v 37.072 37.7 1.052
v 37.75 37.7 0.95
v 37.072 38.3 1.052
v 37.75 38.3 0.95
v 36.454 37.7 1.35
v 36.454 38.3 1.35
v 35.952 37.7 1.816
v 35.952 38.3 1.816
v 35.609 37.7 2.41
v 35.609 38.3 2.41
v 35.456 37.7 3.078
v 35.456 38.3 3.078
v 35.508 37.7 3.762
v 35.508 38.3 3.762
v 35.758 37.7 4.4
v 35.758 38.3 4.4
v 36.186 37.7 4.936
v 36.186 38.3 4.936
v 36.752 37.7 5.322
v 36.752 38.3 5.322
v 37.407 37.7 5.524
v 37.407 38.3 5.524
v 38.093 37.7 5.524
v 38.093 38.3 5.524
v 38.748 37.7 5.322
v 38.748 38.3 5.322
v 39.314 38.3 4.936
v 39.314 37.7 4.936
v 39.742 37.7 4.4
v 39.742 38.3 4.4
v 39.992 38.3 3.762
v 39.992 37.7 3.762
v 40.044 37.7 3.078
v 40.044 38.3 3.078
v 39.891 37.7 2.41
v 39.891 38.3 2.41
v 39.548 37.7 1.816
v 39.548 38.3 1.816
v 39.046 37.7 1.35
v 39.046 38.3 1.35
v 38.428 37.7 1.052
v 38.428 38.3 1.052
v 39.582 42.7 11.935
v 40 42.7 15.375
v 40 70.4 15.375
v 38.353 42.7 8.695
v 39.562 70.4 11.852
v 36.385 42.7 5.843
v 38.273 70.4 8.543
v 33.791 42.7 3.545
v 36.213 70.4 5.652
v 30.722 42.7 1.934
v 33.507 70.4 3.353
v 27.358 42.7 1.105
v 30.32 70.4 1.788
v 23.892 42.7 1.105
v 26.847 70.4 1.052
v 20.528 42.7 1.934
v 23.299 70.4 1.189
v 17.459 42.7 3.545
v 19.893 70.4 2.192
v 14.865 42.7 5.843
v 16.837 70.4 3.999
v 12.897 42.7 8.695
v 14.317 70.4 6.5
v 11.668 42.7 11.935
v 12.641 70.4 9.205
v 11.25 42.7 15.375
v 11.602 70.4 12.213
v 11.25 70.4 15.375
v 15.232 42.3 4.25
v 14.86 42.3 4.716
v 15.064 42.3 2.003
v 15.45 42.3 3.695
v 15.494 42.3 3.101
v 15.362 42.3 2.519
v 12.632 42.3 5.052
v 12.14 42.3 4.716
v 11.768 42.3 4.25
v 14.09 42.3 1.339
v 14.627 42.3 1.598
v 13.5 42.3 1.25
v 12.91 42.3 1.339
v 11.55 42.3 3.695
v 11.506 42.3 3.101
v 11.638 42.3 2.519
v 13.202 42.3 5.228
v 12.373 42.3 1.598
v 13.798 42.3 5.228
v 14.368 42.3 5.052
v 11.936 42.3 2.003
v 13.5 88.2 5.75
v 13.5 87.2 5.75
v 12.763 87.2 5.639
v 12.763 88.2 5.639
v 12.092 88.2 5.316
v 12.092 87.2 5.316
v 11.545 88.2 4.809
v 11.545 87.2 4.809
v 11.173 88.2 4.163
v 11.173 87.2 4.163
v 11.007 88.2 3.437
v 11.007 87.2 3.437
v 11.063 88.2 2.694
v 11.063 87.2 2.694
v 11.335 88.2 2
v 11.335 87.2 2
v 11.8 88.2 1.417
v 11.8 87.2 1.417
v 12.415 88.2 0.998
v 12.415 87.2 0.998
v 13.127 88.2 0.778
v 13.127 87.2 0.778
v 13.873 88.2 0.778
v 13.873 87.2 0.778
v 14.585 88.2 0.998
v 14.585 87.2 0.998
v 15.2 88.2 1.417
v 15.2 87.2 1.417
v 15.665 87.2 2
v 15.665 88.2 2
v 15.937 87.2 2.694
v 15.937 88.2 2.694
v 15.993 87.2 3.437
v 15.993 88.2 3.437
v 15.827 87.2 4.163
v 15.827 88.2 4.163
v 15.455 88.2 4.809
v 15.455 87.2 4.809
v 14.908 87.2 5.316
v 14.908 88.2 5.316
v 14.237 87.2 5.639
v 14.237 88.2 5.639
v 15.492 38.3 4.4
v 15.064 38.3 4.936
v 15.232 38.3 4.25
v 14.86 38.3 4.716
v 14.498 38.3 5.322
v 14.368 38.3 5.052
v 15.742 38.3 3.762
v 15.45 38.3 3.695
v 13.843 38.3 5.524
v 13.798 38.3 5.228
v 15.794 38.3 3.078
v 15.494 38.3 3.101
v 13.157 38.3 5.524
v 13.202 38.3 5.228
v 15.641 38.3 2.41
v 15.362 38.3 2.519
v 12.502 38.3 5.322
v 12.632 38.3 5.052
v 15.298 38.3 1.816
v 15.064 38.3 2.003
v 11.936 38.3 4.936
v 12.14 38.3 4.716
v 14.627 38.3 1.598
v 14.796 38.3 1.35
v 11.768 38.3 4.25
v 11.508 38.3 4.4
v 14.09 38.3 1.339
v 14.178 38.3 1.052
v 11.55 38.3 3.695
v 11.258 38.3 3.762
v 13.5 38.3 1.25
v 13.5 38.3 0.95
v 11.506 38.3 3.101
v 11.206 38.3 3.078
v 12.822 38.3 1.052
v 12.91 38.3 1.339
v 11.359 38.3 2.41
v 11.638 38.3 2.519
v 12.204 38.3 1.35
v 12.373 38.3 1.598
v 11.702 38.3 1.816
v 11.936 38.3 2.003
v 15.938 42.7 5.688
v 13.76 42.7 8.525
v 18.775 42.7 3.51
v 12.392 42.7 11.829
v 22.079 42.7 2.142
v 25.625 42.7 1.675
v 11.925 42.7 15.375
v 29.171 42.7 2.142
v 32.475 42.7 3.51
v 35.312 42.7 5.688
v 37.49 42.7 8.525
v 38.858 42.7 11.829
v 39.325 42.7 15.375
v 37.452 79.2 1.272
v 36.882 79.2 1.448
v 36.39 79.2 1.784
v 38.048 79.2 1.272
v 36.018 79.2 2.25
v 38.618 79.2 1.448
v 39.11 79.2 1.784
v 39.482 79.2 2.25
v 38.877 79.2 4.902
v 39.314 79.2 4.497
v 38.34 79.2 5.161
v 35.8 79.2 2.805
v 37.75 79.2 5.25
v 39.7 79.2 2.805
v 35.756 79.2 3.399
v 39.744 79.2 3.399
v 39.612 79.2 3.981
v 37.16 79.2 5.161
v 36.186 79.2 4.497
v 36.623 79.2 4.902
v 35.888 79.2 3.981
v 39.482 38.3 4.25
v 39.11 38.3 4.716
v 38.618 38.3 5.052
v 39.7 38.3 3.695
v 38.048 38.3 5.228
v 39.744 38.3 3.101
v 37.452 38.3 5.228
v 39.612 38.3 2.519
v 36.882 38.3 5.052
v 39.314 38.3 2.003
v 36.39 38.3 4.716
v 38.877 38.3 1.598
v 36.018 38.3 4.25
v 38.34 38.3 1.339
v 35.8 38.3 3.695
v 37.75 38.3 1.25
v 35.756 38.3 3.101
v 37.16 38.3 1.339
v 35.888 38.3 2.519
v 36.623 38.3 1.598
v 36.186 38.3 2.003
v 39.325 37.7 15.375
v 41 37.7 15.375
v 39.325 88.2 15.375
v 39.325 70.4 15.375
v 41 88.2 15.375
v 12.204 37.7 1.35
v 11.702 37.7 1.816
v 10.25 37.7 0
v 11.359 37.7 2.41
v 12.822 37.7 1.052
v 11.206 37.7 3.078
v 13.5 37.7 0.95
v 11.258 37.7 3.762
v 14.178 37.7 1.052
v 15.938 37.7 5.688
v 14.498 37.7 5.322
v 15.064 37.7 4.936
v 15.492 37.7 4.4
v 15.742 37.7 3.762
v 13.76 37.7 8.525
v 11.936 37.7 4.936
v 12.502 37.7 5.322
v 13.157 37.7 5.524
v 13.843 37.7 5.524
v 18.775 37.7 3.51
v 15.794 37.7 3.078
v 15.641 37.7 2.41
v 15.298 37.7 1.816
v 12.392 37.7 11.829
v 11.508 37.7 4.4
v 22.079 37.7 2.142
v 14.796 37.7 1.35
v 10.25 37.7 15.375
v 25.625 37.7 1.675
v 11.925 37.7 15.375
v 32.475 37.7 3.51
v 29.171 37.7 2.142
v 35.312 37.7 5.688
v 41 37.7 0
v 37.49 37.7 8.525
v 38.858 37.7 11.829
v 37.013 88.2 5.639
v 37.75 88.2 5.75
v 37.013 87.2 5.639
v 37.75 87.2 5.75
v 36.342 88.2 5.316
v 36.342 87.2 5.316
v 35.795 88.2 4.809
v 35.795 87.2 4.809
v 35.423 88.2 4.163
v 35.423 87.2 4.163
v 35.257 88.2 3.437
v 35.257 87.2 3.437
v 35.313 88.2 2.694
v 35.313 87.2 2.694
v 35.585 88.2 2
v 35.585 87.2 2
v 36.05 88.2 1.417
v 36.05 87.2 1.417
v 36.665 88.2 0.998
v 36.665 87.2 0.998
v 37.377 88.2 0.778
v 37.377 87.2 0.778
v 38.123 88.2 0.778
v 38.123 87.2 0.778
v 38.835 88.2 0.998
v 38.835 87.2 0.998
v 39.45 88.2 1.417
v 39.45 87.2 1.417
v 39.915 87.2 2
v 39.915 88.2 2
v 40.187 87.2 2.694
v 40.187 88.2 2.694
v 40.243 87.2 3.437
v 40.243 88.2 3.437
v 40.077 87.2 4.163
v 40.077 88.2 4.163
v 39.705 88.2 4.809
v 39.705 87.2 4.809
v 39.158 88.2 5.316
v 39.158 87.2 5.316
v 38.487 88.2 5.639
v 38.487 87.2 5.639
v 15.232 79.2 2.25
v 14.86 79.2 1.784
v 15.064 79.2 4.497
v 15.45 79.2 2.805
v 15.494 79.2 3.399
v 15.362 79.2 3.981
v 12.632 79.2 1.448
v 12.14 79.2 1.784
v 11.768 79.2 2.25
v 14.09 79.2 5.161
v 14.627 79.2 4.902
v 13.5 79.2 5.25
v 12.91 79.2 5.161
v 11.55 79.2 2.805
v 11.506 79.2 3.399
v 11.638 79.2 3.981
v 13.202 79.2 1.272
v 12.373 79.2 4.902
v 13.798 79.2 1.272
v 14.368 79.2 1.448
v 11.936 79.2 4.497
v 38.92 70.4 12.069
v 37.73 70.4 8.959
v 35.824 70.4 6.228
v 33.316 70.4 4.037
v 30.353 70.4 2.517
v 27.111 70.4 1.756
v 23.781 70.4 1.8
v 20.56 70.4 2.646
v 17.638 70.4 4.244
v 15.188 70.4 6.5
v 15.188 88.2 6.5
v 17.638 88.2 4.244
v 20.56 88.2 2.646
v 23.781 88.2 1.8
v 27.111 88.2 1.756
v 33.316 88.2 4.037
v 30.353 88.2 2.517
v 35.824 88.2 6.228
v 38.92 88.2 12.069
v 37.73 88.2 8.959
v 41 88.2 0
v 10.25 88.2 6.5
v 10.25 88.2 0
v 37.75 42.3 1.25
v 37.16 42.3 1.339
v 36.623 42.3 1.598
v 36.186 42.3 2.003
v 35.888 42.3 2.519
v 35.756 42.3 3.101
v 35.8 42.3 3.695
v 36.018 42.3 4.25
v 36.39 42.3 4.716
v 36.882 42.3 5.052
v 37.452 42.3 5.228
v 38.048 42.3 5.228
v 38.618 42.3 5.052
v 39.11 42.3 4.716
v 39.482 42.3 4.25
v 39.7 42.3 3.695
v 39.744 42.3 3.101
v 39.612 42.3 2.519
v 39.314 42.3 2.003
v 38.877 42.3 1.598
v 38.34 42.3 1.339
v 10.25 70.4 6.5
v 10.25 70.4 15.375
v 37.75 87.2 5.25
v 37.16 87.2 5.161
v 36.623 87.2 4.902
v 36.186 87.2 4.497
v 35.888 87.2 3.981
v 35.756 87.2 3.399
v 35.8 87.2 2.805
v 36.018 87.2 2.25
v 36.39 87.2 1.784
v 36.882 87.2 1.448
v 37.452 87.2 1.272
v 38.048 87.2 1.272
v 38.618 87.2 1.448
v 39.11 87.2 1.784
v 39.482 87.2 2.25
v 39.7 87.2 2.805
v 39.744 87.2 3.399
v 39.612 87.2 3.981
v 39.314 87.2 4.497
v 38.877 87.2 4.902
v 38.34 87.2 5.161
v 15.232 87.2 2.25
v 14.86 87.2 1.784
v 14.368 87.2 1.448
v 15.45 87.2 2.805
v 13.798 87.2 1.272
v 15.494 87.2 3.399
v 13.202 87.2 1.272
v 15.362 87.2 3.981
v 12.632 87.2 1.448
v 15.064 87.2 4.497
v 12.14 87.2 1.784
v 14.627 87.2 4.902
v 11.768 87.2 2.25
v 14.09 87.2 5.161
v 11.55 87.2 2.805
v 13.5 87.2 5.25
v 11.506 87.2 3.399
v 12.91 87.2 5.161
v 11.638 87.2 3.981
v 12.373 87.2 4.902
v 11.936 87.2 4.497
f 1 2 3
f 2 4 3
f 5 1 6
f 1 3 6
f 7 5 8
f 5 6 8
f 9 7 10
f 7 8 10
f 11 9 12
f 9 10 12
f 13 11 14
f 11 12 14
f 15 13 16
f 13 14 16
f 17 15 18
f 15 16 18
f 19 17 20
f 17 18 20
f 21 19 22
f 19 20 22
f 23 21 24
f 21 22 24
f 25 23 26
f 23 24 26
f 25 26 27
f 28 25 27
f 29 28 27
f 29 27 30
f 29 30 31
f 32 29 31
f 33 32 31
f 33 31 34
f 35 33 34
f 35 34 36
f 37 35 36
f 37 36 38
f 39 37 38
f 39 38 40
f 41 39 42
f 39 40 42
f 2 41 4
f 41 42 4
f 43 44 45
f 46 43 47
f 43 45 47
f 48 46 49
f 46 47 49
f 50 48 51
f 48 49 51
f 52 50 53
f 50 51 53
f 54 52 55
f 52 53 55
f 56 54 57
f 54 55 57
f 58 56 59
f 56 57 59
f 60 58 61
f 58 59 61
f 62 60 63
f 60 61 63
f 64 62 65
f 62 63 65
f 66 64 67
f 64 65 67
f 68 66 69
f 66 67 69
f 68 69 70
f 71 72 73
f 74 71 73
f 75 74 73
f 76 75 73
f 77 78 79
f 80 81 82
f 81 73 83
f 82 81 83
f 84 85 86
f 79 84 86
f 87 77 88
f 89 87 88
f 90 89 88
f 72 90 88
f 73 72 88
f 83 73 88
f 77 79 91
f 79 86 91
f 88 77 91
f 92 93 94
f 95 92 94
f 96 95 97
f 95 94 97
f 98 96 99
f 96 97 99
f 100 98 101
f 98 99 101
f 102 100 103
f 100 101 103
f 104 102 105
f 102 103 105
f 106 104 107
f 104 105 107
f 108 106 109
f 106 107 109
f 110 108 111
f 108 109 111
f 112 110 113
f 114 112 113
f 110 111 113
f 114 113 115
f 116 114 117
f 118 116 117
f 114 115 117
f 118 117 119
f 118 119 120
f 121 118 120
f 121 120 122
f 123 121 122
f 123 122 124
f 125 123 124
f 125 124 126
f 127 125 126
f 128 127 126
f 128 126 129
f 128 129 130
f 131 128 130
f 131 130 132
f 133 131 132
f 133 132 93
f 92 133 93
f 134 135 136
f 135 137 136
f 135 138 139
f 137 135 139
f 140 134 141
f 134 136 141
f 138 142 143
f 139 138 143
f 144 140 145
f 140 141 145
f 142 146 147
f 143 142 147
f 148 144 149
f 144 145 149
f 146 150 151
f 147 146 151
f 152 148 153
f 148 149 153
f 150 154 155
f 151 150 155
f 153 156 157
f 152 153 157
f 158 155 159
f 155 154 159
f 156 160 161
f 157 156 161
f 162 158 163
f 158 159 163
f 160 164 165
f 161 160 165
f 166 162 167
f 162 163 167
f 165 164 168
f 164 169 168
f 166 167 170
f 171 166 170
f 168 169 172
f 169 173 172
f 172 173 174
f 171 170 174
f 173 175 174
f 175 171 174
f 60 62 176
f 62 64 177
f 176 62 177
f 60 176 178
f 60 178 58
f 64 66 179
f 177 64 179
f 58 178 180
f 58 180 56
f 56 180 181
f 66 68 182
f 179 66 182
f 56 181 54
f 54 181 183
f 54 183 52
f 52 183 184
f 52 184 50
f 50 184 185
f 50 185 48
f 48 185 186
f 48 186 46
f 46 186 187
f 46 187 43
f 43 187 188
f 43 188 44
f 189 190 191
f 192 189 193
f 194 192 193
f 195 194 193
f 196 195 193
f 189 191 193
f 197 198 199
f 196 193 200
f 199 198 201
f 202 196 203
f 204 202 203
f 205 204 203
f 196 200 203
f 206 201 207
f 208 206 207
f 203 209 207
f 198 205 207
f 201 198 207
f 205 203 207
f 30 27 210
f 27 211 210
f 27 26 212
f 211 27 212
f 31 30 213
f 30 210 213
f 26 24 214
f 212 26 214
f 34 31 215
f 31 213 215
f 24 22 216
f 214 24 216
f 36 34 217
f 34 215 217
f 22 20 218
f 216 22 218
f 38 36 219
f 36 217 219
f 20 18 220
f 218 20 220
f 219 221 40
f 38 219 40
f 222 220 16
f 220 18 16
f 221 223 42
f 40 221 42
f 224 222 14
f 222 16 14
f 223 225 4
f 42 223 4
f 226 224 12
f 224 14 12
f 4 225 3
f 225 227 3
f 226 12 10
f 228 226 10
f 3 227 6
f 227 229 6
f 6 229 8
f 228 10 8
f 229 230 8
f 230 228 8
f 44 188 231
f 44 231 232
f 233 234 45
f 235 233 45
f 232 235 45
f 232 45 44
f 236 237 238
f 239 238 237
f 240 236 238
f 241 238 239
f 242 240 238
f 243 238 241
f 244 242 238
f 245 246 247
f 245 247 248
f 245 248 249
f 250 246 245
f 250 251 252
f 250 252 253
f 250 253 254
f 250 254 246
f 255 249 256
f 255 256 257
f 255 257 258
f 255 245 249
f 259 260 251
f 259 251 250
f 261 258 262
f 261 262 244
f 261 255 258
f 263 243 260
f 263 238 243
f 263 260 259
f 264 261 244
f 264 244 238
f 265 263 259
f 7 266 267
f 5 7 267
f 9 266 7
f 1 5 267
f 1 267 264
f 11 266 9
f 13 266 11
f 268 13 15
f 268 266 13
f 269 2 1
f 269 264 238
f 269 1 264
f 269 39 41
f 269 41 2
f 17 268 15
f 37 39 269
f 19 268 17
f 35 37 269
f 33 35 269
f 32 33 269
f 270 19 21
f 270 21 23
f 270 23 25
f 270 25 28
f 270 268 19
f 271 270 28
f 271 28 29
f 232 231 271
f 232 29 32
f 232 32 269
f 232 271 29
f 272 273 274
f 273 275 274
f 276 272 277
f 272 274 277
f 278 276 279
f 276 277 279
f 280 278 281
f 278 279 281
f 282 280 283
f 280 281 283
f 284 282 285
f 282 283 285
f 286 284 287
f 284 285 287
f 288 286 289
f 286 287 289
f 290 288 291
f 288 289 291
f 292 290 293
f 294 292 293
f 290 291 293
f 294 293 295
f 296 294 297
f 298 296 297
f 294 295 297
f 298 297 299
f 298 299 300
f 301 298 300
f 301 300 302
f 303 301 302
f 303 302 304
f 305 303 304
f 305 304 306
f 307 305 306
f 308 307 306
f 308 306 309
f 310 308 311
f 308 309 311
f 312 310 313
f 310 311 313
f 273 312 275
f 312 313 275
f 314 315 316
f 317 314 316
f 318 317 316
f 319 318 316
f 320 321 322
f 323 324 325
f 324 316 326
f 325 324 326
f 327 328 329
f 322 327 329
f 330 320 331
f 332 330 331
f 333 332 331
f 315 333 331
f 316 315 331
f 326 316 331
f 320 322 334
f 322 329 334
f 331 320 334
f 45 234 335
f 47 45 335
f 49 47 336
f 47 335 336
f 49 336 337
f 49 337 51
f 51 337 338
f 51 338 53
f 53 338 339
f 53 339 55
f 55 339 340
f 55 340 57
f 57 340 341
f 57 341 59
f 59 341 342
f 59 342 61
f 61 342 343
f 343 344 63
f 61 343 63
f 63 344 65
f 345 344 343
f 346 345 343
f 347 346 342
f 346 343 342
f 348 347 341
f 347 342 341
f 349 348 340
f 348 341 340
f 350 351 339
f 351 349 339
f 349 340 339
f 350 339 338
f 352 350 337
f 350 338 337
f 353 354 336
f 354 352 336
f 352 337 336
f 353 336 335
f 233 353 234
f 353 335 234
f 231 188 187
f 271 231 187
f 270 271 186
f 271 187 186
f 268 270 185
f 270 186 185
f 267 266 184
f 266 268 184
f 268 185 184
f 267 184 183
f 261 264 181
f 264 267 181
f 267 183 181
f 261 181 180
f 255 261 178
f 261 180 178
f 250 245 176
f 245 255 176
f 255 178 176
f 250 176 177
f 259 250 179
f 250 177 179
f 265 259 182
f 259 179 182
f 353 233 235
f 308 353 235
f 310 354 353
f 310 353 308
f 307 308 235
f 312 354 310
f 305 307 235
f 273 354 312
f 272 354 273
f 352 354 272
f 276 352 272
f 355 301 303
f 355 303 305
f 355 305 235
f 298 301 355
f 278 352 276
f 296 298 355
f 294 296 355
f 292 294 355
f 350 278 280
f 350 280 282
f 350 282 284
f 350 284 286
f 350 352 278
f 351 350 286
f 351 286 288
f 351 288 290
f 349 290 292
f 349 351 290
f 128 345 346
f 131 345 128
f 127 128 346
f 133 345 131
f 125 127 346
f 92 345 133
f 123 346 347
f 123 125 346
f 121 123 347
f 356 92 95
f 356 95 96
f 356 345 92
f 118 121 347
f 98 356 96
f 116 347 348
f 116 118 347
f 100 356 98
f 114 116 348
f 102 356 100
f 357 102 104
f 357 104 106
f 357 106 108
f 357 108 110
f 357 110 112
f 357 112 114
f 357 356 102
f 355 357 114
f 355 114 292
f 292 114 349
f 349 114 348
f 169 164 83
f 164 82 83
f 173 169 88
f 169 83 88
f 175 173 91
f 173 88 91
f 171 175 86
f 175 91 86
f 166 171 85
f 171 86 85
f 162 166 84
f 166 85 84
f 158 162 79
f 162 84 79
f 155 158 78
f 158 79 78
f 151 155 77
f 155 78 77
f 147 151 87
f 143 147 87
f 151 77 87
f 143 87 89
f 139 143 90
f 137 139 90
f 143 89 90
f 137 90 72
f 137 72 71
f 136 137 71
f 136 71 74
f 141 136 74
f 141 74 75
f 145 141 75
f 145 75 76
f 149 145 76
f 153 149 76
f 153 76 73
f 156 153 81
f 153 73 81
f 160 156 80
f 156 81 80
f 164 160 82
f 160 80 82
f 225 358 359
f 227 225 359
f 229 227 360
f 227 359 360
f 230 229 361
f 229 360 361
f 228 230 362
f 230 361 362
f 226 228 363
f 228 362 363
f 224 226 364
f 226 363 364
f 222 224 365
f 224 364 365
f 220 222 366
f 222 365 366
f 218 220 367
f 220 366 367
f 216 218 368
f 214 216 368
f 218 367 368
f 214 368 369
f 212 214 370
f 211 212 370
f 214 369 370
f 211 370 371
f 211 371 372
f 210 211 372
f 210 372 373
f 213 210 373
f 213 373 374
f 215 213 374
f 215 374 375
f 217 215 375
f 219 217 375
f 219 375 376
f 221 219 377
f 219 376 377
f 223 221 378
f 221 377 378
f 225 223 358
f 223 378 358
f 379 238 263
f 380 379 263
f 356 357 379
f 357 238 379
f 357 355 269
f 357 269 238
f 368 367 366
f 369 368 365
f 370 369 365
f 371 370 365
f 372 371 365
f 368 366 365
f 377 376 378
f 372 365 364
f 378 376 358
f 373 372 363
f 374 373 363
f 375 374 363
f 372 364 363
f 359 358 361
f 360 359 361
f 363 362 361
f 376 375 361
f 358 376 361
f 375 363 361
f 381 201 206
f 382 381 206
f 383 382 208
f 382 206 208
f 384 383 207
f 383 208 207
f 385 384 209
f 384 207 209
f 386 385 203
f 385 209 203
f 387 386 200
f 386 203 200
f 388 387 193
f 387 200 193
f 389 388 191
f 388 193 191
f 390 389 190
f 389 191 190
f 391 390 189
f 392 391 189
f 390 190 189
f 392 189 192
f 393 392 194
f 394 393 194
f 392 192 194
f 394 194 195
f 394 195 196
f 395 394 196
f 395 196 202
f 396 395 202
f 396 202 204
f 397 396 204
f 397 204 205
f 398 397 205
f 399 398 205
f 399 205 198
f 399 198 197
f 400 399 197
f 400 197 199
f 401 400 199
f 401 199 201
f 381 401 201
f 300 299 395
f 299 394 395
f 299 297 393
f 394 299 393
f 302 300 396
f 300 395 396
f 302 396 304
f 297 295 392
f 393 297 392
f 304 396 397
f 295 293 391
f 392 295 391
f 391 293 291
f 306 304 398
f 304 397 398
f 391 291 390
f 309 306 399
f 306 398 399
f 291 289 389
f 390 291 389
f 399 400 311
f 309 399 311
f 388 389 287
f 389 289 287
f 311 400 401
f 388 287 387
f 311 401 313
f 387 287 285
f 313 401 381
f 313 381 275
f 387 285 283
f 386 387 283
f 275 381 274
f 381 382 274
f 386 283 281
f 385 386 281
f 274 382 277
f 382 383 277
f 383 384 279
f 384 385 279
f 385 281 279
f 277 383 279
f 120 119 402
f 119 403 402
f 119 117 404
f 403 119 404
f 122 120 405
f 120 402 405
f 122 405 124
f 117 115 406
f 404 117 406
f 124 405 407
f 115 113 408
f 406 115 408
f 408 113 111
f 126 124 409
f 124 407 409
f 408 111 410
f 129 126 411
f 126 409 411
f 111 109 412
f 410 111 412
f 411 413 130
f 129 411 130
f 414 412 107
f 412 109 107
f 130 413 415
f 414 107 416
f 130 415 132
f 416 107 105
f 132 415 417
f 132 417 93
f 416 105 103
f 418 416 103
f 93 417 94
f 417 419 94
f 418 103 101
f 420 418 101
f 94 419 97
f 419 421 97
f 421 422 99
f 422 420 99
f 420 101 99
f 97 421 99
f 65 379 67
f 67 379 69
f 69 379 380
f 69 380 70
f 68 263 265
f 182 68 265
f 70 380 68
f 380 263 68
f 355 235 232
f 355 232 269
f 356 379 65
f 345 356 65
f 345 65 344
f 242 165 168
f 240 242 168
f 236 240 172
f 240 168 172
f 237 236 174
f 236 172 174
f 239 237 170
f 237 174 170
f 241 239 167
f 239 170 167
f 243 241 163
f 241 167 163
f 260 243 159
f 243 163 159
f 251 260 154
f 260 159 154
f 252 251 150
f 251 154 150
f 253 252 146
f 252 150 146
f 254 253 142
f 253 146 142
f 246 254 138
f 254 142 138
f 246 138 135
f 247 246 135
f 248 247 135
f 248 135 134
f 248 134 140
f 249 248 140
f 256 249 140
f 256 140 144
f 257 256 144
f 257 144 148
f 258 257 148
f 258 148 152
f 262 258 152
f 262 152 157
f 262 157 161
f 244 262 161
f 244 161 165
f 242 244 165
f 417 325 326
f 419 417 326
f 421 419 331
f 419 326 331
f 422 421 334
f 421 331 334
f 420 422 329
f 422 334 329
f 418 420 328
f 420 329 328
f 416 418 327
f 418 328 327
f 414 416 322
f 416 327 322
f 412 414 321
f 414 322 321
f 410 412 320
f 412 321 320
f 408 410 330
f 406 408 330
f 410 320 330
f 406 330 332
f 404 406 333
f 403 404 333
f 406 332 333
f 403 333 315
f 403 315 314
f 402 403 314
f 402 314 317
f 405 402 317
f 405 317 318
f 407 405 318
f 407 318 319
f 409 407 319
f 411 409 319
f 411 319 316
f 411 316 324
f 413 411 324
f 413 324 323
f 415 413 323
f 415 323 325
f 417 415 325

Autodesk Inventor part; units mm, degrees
ref_plane "Work Plane1" through (25.625, 84.2, 15.375) normal (0, 1, 0) x (0, 0, -1)
sketch "Sketch1" plane through (25.625, 84.2, 15.375) normal (0, 1, 0) x (0, 0, -1)
  line L0 (11.5, -1.5) -> (11, -1.5) projected
  line L1 (11, -1.5) -> (11, 1.5) projected
  line L2 (11, 1.5) -> (11.5, 1.5) projected
  line L3 (11.5, 1.5) -> (11.5, -1.5) projected
  line L4 (-12, -1.5) -> (-12, 1.5) projected
  line L5 (-12, 1.5) -> (-11.5, 1.5) projected
  line L6 (-11.5, 1.5) -> (-11.5, -1.5) projected
  line L7 (-11.5, -1.5) -> (-12, -1.5) projected
  circle A0 centre (0, 0) radius 5 projected
  circle A1 centre (0, 0) radius 13.7 projected
  line L8 (18.875, -15.375) -> (18.875, 116.625) projected
  line L9 (18.875, 116.625) -> (15.375, 116.625) projected
  line L10 (15.375, -15.375) -> (15.375, 116.625) projected
  line L11 (18.875, -15.375) -> (15.375, -15.375) projected
  line L12 (15.375, -15.375) -> (0, -15.375)
  line L13 (0, -15.375) -> (0, 15.375)
  line L14 (0, 15.375) -> (15.375, 15.375)
  line L15 (15.375, 15.375) -> (15.375, -15.375)
  circle A2 centre (12.125, 12.125) radius 3.25
  circle A3 centre (12.125, -12.125) radius 3.25
  line L16 (8.875, 15.375) -> (8.875, 10.4367)
  point P0 (15.375, 25.625)
  point P1 (0, -13.7)
  dimension "d2" = 15.375
  dimension "d3" = 15.375
  dimension "d4" = 6.5
  dimension "d5" = 6.5
ref_plane "Work Plane2" through (11.25, 70.4, 1) normal (0, 1, 0) x (0, 0, 1)
extrude "Extrusion1" add sketch "Sketch1" along normal blind 4 and the other way blind 13.8 contours A1 L16 A2 L10 A3 L12 L13 | L16 L14 A2 | A2 | A3 L10 L12 | A3 | L14 L10 A2
sketch "Sketch2" plane through (25.625, 70.4, 15.375) normal (0, -1, 0) x (1, 0, 0)
  arc A0 (-3.651, 5.9062) -> (-4.7619, 7.7035) centre (-4.2064, 6.8048) ccw projected
  arc A1 (-3.651, 5.9062) -> (-6.4477, 2.5768) centre (0, 0) ccw projected
  arc A2 (-8.4097, 3.3608) -> (-6.4477, 2.5768) centre (-7.4287, 2.9688) ccw projected
  arc A3 (-4.7619, 7.7035) -> (-8.4097, 3.3608) centre (0, 0) ccw projected
  arc A4 (6.4477, 2.5768) -> (8.4097, 3.3608) centre (7.4287, 2.9688) ccw projected
  arc A5 (6.4477, 2.5768) -> (3.651, 5.9062) centre (0, 0) ccw projected
  arc A6 (4.7619, 7.7035) -> (3.651, 5.9062) centre (4.2064, 6.8048) ccw projected
  arc A7 (8.4097, 3.3608) -> (4.7619, 7.7035) centre (0, 0) ccw projected
  arc A8 (-6.4563, -2.5553) -> (-8.4209, -3.3328) centre (-7.4386, -2.9441) ccw projected
  arc A9 (-6.4563, -2.5553) -> (-3.651, -5.9062) centre (0, 0) ccw projected
  arc A10 (-4.7619, -7.7035) -> (-3.651, -5.9062) centre (-4.2064, -6.8048) ccw projected
  arc A11 (-8.4209, -3.3328) -> (-4.7619, -7.7035) centre (0, 0) ccw projected
  arc A12 (3.651, -5.9062) -> (4.7619, -7.7035) centre (4.2064, -6.8048) ccw projected
  arc A13 (3.651, -5.9062) -> (6.4563, -2.5553) centre (0, 0) ccw projected
  arc A14 (8.4209, -3.3328) -> (6.4563, -2.5553) centre (7.4386, -2.9441) ccw projected
  arc A15 (4.7619, -7.7035) -> (8.4209, -3.3328) centre (0, 0) ccw projected
  circle A16 centre (10.65, 0.0124) radius 1.15 projected
  circle A17 centre (0, 8) radius 1.0564 projected
  circle A18 centre (0, -8) radius 1.0564 projected
  circle A19 centre (0, 0) radius 5 projected
  circle A20 centre (0, 0) radius 13.7 projected
  line L0 (15.375, -18.875) -> (-116.625, -18.875) projected
  line L1 (-116.625, -18.875) -> (-116.625, -15.375) projected
  line L2 (15.375, -15.375) -> (-116.625, -15.375) projected
  line L3 (15.375, -18.875) -> (15.375, -15.375) projected
  line L4 (15.375, -15.375) -> (-15.375, -15.375)
  line L5 (-15.375, -15.375) -> (-15.375, 0)
  line L6 (-15.375, 0) -> (15.375, 0)
  line L7 (15.375, 0) -> (15.375, -15.375)
  circle A21 centre (0, 0) radius 14.375
  point P0 (-25.625, -15.375)
  point P1 (13.7, 0)
  point P2 (-13.7, 0)
  point P3 (-15.375, -15.375)
  point P4 (14.375, 0)
  point P5 (-14.375, 0)
  dimension "d10" = 15.375
  dimension "d11" = 15.375
ref_plane "Work Plane3" through (11.25, 42.7, 1) normal (0, -1, 0) x (1, 0, 0)
extrude "Extrusion2" add sketch "Sketch2" along normal up to surface (27.7 mm away) contours L6 L7 L2 L5 A21
sketch "Sketch3" plane through (25.625, 42.7, 15.375) normal (0, -1, 0) x (1, 0, 0)
  arc A0 (-3.651, 5.9062) -> (-4.7619, 7.7035) centre (-4.2064, 6.8048) ccw projected
  arc A1 (-3.651, 5.9062) -> (-6.4477, 2.5768) centre (0, 0) ccw projected
  arc A2 (-8.4097, 3.3608) -> (-6.4477, 2.5768) centre (-7.4287, 2.9688) ccw projected
  arc A3 (-4.7619, 7.7035) -> (-8.4097, 3.3608) centre (0, 0) ccw projected
  arc A4 (6.4477, 2.5768) -> (8.4097, 3.3608) centre (7.4287, 2.9688) ccw projected
  arc A5 (6.4477, 2.5768) -> (3.651, 5.9062) centre (0, 0) ccw projected
  arc A6 (4.7619, 7.7035) -> (3.651, 5.9062) centre (4.2064, 6.8048) ccw projected
  arc A7 (8.4097, 3.3608) -> (4.7619, 7.7035) centre (0, 0) ccw projected
  arc A8 (-6.4563, -2.5553) -> (-8.4209, -3.3328) centre (-7.4386, -2.9441) ccw projected
  arc A9 (-6.4563, -2.5553) -> (-3.651, -5.9062) centre (0, 0) ccw projected
  arc A10 (-4.7619, -7.7035) -> (-3.651, -5.9062) centre (-4.2064, -6.8048) ccw projected
  arc A11 (-8.4209, -3.3328) -> (-4.7619, -7.7035) centre (0, 0) ccw projected
  arc A12 (3.651, -5.9062) -> (4.7619, -7.7035) centre (4.2064, -6.8048) ccw projected
  arc A13 (3.651, -5.9062) -> (6.4563, -2.5553) centre (0, 0) ccw projected
  arc A14 (8.4209, -3.3328) -> (6.4563, -2.5553) centre (7.4386, -2.9441) ccw projected
  arc A15 (4.7619, -7.7035) -> (8.4209, -3.3328) centre (0, 0) ccw projected
  circle A16 centre (10.65, 0.0124) radius 1.15 projected
  circle A17 centre (0, 8) radius 1.0564 projected
  circle A18 centre (0, -8) radius 1.0564 projected
  circle A19 centre (0, 0) radius 5 projected
  circle A20 centre (0, 0) radius 13.7 projected
  line L0 (15.375, -18.875) -> (-116.625, -18.875) projected
  line L1 (-116.625, -18.875) -> (-116.625, -15.375) projected
  line L2 (15.375, -15.375) -> (-116.625, -15.375) projected
  line L3 (15.375, -18.875) -> (15.375, -15.375) projected
  line L4 (15.375, 0) -> (15.375, -15.375) projected
  line L5 (15.375, -15.375) -> (-15.375, -15.375)
  line L6 (-15.375, -15.375) -> (-15.375, 0)
  line L7 (-15.375, 0) -> (15.375, 0)
  line L8 (15.375, 0) -> (15.375, -15.375)
  point P0 (-25.625, -15.375)
  point P1 (15.375, 0)
  point P2 (13.7, 0)
  point P3 (-13.7, 0)
  point P4 (-15.375, -15.375)
  dimension "d14" = 15.375
  dimension "d15" = 15.375
ref_plane "Work Plane4" through (11.925, 37.7, 1.675) normal (0, -1, 0) x (1, 0, 0)
extrude "Extrusion3" add sketch "Sketch3" along normal up to surface (5 mm away) contours L7 L4 L2 L6 A20
sketch "Sketch4" plane through (25.625, 37.7, 15.375) normal (0, -1, 0) x (1, 0, 0)
  circle A0 centre (-12.125, -12.125) radius 1.8 projected
  circle A1 centre (12.125, -12.125) radius 1.8 projected
  point P0 (-25.625, -15.375)
hole "Hole1" at (13.5, 37.7, 3.25) at (37.75, 37.7, 3.25) direction (0, 1, 0) diameter 4 depth 4.6 counterbore diameter 4.6 counterbore depth 0.6
sketch "Sketch5" plane through (25.625, 88.2, 15.375) normal (0, 1, 0) x (1, 0, 0)
  arc A0 (13.7, 0) -> (-10.4367, 8.875) centre (0, 0) ccw projected
  line L0 (13.7, 0) -> (15.375, 0) projected
  line L1 (15.375, 0) -> (15.375, 15.375) projected
  line L2 (15.375, 15.375) -> (-15.375, 15.375) projected
  line L3 (-15.375, 15.375) -> (-15.375, 8.875) projected
  line L4 (-15.375, 8.875) -> (-10.4367, 8.875) projected
  circle A1 centre (12.125, 12.125) radius 3.25
  circle A2 centre (-12.125, 12.125) radius 3.25
  point P0 (-25.625, 15.375)
  dimension "d25" = 6.5
  dimension "d26" = 6.5
hole "Hole2" at (37.75, 88.2, 3.25) at (13.5, 88.2, 3.25) direction (0, -1, 0) diameter 4 depth 9 counterbore diameter 5 counterbore depth 1
equation "\"d3\" = d2"
equation "\"d11\" = d10"
equation "\"d15\" = d14"
properties part number "motur_holder"
